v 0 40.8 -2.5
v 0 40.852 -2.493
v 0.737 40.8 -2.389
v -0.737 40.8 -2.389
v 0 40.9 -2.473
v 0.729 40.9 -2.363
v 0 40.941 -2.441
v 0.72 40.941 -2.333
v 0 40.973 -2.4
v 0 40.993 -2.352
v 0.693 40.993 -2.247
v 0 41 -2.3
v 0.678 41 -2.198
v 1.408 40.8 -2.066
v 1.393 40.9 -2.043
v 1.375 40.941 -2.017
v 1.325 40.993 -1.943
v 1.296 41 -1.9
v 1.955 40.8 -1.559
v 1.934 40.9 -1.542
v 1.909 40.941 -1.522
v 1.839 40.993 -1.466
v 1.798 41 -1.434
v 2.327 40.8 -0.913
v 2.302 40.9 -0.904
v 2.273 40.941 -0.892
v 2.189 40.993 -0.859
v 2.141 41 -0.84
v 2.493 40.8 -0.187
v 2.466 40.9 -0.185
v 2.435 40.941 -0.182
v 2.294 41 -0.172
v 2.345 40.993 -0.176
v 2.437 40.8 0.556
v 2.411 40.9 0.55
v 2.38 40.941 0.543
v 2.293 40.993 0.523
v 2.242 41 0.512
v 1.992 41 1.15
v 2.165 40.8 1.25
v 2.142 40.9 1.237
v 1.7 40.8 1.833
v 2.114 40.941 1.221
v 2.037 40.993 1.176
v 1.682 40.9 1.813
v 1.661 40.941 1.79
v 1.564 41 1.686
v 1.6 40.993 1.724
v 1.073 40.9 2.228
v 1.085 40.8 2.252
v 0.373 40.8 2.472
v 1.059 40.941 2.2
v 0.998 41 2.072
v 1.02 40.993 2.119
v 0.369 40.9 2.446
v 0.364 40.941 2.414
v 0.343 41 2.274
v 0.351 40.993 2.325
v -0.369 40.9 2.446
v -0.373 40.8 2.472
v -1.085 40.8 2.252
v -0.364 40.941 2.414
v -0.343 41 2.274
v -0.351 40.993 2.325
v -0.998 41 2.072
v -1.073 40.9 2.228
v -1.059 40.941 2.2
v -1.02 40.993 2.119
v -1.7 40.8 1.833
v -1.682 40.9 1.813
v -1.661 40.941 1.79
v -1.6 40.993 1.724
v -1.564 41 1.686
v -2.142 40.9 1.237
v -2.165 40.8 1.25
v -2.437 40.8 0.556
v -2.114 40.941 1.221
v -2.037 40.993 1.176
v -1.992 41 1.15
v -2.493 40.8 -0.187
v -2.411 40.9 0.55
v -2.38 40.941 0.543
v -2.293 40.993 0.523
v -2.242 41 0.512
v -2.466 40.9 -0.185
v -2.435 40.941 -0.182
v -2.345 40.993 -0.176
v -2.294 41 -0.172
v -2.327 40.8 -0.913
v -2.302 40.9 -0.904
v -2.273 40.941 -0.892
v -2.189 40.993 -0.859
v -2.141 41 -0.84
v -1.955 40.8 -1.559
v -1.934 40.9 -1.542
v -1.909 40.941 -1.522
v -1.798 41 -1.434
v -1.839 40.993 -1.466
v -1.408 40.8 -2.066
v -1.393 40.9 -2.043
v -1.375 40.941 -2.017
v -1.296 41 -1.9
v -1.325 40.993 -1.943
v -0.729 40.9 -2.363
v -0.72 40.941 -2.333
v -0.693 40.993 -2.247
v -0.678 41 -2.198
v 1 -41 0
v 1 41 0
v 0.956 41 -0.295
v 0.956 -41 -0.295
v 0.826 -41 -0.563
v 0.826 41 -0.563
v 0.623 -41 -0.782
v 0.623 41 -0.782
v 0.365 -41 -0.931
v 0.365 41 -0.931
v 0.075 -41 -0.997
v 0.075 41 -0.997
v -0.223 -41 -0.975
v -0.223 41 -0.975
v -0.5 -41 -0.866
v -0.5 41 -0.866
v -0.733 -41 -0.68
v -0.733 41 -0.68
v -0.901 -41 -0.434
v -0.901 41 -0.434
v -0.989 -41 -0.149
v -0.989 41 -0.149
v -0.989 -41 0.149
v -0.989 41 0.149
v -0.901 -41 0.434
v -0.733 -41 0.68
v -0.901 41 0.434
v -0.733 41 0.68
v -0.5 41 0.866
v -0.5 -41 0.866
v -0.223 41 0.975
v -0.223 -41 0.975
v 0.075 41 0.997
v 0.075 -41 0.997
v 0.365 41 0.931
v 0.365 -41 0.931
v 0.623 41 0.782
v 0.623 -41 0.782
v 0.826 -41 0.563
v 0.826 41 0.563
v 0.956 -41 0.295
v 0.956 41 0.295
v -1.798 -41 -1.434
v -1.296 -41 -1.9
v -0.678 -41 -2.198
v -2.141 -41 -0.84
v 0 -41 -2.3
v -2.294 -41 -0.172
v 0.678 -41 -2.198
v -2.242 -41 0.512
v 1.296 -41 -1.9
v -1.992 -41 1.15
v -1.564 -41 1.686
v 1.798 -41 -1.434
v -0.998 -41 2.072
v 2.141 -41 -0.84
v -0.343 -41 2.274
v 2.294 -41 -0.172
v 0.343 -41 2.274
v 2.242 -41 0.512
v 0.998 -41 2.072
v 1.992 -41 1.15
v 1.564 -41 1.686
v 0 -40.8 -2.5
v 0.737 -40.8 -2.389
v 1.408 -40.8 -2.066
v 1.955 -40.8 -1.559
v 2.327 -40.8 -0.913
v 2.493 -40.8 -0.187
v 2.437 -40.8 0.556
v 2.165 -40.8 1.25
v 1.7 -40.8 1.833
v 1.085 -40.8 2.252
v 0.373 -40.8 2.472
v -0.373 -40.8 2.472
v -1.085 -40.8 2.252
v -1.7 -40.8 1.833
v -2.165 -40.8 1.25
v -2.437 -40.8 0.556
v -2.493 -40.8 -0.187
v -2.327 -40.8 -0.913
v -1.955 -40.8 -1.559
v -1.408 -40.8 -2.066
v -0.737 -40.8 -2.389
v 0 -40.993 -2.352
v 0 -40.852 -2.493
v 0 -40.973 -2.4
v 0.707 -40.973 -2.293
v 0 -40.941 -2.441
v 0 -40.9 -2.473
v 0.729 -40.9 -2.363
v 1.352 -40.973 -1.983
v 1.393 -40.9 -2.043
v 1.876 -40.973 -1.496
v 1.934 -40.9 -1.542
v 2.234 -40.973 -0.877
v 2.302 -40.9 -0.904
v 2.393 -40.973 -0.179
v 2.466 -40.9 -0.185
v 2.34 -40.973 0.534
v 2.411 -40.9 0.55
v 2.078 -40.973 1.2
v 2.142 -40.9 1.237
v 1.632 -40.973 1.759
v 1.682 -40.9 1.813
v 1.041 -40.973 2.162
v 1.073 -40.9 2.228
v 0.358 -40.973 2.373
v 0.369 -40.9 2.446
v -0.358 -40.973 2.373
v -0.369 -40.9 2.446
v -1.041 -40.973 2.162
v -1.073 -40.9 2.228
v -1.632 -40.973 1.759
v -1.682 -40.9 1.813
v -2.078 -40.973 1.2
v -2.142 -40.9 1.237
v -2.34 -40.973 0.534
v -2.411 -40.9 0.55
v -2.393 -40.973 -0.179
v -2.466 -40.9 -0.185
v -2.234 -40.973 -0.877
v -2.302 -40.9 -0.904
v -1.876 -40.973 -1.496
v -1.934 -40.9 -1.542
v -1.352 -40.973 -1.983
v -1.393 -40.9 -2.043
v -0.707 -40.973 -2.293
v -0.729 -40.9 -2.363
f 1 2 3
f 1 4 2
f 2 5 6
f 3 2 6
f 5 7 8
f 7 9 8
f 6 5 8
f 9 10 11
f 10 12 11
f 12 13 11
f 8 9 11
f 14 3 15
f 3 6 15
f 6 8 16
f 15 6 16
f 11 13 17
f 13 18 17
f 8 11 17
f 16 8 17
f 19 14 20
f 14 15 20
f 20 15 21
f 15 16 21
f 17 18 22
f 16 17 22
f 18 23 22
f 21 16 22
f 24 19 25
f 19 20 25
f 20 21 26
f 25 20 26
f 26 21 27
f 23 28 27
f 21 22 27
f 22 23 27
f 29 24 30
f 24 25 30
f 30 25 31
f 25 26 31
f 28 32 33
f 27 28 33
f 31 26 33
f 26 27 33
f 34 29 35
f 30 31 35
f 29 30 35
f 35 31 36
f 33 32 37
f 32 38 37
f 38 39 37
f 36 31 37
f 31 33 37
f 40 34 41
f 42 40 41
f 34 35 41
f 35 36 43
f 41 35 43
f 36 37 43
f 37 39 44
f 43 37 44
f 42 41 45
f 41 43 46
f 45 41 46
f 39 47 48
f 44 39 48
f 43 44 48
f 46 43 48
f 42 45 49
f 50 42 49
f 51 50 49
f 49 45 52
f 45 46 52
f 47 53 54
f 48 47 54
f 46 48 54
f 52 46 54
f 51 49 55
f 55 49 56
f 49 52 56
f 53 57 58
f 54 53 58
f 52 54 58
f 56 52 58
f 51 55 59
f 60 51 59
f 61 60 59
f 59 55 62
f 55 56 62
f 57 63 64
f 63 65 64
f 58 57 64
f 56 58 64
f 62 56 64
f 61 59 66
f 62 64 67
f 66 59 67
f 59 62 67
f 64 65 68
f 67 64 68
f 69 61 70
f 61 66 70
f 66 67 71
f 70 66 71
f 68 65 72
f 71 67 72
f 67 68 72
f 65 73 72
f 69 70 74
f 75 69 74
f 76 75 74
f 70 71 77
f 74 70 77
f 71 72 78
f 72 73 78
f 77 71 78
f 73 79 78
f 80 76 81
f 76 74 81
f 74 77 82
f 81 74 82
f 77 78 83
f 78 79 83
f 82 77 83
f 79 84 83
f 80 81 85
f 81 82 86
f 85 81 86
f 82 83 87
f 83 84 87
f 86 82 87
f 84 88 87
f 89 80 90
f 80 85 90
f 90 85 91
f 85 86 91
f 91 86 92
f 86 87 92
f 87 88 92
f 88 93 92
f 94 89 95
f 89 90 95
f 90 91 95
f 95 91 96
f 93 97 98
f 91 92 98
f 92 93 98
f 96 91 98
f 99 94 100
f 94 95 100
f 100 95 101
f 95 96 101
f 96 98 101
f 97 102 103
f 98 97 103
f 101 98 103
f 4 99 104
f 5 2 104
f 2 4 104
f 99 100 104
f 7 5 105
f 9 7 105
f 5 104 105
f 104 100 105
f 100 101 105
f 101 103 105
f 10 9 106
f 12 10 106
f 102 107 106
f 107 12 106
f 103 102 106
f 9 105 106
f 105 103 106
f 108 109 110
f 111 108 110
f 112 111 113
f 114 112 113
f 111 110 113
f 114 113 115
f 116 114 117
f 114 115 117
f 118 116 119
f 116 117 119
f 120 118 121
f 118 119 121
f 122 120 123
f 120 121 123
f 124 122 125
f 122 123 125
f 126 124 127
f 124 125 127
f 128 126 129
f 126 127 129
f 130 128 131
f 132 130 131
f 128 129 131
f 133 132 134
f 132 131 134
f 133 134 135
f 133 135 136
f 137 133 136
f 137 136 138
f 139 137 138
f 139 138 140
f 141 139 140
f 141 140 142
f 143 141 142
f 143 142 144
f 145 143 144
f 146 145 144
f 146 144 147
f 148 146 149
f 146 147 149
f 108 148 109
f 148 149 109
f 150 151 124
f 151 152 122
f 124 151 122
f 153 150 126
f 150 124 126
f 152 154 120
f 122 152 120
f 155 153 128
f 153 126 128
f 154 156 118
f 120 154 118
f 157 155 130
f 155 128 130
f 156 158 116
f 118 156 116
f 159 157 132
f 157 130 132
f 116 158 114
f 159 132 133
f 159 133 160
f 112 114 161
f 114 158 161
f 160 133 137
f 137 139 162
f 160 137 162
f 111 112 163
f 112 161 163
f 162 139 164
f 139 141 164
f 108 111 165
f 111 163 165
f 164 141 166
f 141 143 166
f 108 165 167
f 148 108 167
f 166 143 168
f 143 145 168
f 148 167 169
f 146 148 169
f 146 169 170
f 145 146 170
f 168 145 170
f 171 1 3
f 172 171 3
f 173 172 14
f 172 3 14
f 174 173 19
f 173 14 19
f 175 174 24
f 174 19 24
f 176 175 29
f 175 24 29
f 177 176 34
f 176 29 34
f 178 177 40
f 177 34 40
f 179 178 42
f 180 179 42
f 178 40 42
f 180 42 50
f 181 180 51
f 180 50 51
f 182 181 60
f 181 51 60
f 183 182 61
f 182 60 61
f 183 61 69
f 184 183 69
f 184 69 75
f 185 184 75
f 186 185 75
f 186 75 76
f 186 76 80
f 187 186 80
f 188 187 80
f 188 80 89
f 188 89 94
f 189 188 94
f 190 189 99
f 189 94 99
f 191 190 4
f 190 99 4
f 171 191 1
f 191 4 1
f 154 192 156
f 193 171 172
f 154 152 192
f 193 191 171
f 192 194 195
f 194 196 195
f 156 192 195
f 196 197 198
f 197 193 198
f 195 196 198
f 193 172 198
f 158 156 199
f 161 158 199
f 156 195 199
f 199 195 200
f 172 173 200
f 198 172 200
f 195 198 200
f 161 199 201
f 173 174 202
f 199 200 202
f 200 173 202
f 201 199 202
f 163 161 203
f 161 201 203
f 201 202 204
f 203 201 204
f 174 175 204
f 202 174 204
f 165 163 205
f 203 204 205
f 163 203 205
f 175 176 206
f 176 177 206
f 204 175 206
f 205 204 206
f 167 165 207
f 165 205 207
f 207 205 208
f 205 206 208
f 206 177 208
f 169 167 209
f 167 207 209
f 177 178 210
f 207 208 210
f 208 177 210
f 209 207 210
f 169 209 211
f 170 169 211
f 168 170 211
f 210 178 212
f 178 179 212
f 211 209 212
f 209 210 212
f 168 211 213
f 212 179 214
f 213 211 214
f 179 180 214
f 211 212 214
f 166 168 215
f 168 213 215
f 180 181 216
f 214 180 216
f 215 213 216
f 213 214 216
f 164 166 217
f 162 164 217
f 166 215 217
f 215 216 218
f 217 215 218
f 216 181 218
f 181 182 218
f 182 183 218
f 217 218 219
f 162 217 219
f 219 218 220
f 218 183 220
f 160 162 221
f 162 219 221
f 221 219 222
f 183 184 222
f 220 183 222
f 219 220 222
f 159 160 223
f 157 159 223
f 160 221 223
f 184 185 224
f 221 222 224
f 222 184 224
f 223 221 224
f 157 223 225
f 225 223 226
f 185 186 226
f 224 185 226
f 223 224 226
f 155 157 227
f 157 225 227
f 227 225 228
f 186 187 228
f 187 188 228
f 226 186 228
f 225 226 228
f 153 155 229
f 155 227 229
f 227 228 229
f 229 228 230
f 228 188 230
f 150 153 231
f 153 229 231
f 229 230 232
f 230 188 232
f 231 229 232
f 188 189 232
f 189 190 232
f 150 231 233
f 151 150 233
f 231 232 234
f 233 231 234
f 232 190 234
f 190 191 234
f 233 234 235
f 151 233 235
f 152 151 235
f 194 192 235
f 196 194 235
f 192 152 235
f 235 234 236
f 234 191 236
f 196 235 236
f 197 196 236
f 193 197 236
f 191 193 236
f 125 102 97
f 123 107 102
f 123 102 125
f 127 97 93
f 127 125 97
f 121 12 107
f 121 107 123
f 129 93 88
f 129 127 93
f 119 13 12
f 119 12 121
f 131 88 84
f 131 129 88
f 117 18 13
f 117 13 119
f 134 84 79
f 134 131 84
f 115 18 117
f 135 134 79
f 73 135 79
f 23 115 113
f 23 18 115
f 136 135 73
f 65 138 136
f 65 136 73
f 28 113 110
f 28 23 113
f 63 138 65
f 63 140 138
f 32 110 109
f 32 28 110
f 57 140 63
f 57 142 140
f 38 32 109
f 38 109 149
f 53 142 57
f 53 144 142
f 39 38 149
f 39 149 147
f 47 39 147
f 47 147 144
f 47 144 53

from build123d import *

# Parameters (mm, degrees)
SKETCH3_W          = 2.5
SKETCH3_H          = 82
SKETCH4_R          = 1
CUT_EXTRUDE1_DEPTH = 82
FILLET1_R          = 0.2


with BuildPart() as part:
    # Sketch3 → Revolve2 (revolve)
    with BuildSketch(Plane(origin=(0, 0, 0), x_dir=(0, 0, -1), z_dir=(1, 0, 0))):
        with Locations((1.25, 0)):
            Rectangle(SKETCH3_W, SKETCH3_H)
    revolve(axis=Axis((0, 41, 0), (0, -1, 0)))

    # Sketch4 → Cut-Extrude1 (cut)
    with BuildSketch(Plane(origin=(0, 41, 0), x_dir=(1, 0, 0), z_dir=(0, 1, 0))):
        Circle(SKETCH4_R)
    extrude(amount=-CUT_EXTRUDE1_DEPTH, mode=Mode.SUBTRACT)

    # Fillet1
    fillet1_edges = [part.edges().sort_by_distance(p)[0] for p in [
        (0, 41, 2.5),
        (0, -41, 2.5),
    ]]
    fillet(fillet1_edges, radius=FILLET1_R)


solid = part.part
